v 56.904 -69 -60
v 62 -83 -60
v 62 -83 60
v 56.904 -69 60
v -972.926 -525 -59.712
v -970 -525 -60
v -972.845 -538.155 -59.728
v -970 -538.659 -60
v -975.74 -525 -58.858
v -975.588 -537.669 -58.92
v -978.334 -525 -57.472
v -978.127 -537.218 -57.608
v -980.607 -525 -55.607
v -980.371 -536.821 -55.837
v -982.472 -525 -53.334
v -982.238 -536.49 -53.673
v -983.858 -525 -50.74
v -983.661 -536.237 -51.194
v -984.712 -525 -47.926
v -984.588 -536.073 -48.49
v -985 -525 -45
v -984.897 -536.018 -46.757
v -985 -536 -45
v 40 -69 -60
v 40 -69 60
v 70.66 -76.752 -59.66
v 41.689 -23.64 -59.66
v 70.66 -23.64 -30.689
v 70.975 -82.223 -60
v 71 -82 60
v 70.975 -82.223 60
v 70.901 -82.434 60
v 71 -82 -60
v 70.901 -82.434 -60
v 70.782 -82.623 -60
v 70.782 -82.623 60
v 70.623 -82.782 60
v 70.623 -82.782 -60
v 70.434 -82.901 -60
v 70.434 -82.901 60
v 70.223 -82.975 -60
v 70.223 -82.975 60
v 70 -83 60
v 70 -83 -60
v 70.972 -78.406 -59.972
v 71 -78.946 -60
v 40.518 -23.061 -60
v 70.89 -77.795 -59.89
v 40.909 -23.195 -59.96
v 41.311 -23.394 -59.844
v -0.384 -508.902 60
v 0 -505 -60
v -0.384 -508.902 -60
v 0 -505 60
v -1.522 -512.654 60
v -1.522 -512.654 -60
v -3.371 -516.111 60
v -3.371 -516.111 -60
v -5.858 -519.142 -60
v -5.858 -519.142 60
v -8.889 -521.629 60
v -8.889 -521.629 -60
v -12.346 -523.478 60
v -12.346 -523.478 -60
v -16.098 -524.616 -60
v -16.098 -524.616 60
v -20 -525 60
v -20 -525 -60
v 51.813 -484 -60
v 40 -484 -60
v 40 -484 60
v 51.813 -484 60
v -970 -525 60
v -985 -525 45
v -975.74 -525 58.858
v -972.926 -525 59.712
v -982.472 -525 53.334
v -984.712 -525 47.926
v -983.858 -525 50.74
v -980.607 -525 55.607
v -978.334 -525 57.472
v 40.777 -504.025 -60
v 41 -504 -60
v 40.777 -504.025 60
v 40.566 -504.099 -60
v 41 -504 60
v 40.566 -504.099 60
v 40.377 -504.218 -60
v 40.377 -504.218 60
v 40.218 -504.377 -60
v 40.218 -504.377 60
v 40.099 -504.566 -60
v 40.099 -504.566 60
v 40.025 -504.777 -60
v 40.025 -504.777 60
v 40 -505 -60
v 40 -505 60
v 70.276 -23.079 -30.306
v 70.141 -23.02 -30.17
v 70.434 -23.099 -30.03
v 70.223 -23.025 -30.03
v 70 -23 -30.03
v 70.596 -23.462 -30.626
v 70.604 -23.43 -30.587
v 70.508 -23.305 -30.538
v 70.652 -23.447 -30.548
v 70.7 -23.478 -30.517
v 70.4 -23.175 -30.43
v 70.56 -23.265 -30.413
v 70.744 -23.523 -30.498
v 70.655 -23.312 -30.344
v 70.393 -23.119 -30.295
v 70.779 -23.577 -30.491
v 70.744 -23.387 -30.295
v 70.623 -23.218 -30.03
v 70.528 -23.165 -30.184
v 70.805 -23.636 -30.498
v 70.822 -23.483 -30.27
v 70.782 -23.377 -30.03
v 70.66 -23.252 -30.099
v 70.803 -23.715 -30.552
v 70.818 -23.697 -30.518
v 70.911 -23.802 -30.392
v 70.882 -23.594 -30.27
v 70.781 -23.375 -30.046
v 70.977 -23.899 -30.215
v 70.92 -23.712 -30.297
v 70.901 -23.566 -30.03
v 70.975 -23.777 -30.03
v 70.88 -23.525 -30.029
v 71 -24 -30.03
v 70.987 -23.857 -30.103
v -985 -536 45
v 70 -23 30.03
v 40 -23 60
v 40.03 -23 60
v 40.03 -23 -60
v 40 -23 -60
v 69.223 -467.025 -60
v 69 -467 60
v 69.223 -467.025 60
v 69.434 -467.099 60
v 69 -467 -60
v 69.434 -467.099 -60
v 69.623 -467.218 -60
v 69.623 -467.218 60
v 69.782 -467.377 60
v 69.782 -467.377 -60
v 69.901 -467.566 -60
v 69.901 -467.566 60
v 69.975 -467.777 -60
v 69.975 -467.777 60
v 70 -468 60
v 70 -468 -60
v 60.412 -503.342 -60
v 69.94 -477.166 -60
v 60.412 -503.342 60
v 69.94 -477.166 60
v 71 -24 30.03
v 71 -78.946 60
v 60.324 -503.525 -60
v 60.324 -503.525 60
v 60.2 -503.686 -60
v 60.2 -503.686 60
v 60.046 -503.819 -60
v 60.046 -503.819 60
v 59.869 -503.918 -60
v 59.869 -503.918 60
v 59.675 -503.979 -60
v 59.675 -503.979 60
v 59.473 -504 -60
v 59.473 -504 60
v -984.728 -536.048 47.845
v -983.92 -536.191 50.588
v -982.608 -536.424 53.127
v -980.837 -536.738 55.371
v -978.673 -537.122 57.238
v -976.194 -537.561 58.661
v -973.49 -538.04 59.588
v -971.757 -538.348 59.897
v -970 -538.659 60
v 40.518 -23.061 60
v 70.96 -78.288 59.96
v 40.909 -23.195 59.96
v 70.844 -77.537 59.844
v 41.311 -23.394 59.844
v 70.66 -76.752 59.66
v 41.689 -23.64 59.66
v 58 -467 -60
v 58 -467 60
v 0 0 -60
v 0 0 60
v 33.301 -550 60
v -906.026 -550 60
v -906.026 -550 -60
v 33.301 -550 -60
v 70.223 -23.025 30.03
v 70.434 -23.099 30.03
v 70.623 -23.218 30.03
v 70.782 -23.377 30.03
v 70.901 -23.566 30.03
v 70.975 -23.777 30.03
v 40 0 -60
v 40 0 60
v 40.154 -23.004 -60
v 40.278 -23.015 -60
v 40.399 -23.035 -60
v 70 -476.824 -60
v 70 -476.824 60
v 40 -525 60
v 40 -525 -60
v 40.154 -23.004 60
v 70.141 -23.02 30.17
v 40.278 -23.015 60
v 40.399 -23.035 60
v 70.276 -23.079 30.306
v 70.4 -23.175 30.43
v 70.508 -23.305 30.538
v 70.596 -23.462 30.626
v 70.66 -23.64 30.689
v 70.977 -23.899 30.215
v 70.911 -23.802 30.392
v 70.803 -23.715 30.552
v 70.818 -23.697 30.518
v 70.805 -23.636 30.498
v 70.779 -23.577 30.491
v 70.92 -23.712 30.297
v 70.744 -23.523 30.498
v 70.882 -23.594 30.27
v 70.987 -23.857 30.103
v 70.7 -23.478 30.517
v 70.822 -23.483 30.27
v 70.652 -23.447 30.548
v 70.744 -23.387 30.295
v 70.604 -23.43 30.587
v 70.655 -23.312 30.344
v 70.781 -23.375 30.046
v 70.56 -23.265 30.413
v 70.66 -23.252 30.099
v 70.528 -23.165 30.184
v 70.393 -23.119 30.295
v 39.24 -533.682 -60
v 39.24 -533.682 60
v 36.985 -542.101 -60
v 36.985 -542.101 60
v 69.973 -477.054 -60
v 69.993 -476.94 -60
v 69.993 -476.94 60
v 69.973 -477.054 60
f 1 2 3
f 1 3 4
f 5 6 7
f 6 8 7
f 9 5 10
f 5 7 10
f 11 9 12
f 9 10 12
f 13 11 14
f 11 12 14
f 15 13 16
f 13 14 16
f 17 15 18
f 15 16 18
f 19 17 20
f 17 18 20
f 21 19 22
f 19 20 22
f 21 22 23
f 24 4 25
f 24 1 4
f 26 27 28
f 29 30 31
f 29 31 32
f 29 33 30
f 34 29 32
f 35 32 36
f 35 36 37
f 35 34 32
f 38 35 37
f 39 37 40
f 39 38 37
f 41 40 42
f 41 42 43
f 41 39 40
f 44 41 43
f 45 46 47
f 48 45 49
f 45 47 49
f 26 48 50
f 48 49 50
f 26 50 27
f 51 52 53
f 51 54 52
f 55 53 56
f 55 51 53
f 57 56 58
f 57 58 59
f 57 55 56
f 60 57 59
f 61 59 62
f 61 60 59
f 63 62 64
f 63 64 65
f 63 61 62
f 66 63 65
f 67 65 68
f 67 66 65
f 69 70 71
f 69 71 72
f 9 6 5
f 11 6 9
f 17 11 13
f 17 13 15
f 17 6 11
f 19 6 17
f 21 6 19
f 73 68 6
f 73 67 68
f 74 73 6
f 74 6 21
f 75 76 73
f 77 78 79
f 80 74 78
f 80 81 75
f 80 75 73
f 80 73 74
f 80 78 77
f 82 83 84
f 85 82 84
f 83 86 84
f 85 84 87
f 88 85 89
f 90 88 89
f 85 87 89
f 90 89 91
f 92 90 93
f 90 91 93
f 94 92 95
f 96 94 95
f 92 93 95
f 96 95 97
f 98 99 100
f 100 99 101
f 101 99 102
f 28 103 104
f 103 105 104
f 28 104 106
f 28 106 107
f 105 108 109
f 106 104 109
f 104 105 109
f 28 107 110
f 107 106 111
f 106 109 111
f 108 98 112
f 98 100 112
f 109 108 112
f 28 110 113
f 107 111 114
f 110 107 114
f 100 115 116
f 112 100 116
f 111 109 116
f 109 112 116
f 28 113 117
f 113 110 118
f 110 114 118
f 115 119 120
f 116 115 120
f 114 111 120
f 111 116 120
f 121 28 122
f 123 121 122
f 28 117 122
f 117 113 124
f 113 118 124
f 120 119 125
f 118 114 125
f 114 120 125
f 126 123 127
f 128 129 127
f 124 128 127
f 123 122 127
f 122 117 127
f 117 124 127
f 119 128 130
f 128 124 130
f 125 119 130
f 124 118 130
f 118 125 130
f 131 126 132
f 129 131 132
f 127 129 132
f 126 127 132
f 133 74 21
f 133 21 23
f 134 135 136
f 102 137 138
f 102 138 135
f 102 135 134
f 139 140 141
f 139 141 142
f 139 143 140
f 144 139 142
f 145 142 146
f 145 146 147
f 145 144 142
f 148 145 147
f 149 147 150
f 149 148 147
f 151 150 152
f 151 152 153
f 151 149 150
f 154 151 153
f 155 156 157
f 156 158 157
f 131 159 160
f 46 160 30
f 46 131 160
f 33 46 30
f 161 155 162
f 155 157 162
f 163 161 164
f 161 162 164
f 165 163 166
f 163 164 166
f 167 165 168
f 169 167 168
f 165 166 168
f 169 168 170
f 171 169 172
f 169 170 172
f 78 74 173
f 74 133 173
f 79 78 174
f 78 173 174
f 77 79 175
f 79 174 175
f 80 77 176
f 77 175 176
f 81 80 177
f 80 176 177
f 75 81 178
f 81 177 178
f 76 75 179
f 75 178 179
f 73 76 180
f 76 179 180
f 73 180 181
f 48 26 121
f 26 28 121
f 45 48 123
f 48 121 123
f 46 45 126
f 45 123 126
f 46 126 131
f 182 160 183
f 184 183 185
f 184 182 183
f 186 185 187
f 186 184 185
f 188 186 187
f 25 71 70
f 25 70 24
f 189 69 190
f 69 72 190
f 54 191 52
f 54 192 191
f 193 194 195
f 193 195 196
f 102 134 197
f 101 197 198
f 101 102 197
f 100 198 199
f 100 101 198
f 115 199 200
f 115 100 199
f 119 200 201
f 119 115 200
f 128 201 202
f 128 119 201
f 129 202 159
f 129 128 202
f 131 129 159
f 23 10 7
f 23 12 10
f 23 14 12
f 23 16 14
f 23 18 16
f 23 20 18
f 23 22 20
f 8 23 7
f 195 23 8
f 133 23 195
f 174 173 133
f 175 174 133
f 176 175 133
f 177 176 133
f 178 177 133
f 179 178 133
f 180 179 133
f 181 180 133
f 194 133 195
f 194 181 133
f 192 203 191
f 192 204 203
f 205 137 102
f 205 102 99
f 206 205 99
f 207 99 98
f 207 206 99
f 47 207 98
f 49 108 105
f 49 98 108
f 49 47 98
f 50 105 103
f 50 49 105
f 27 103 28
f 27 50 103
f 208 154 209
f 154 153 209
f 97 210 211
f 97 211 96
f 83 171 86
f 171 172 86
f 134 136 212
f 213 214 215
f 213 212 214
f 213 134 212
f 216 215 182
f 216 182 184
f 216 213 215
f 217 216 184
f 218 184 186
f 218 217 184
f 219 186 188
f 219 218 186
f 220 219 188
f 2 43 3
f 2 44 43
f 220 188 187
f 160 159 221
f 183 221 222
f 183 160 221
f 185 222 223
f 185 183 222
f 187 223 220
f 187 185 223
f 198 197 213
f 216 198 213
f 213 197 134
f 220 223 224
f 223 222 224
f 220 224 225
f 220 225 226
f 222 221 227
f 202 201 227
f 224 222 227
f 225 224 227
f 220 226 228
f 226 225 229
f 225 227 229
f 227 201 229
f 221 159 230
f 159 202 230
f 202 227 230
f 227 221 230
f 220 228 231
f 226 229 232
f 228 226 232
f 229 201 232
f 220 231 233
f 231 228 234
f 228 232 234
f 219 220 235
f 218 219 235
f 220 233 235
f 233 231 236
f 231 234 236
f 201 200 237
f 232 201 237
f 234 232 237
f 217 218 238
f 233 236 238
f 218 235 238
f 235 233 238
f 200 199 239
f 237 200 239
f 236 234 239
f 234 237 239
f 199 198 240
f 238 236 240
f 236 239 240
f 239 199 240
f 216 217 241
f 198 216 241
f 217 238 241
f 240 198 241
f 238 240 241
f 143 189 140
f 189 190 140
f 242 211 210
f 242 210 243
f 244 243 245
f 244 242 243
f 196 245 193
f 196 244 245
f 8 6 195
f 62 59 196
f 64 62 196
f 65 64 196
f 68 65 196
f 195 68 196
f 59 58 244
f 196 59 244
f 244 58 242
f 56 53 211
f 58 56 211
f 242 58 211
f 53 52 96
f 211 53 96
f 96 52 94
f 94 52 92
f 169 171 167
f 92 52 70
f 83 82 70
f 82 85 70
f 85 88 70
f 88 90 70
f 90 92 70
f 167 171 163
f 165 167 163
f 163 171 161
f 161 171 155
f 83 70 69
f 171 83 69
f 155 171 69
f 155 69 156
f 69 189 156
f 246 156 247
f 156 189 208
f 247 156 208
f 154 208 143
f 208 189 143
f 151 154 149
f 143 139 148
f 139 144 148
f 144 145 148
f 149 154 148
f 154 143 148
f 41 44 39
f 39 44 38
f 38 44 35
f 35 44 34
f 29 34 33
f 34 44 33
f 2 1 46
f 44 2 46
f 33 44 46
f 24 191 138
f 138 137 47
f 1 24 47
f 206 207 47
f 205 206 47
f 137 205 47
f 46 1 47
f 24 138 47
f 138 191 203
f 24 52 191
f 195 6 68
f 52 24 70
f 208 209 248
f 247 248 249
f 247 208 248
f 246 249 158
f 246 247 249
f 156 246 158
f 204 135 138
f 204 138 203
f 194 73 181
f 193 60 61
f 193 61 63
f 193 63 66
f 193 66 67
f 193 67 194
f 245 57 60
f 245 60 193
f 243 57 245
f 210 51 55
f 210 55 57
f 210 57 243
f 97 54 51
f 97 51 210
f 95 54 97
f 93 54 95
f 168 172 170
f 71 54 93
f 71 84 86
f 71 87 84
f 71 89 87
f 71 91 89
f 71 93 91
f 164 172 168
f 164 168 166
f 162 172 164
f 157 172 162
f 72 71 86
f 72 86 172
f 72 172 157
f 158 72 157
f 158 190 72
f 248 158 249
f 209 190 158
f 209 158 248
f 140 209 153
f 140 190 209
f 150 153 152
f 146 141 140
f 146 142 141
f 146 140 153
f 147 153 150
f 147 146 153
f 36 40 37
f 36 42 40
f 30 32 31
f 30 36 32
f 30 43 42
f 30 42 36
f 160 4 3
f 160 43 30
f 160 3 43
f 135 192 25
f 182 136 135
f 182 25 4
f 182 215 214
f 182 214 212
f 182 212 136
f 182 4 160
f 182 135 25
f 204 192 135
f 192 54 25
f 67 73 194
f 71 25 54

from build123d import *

# Parameters (mm, degrees)
BOSS_EXTRUDE1_DEPTH = 60
FILLET1_R           = 20
FILLET2_R           = 50
SKETCH2_W           = 946.025641026
SKETCH2_H           = 25
CUT_EXTRUDE1_DEPTH  = 1147.843494118
FILLET3_R           = 15
BOSS_EXTRUDE2_DEPTH = 60
CHAMFER1_START      = 58.356662002
CHAMFER1_OUTLINE_W  = 43
CHAMFER1_OUTLINE_H  = 66
CHAMFER1_DEPTH      = 20.643337998
CHAMFER2_START      = 58.356662002
CHAMFER2_OUTLINE_W  = 43
CHAMFER2_OUTLINE_H  = 66
CHAMFER2_DEPTH      = 20.643337998
FILLET4_R           = 1


with BuildPart() as part:
    # Sketch1 → Boss-Extrude1 (new, symmetric)
    with BuildSketch(Plane.XY):
        Polygon((0, 0), (0, -525), (-985, -525), (-985, -536), (-765, -575), (40, -575), (40, 0), align=None)
    extrude(amount=BOSS_EXTRUDE1_DEPTH, both=True)

    # Fillet1
    fillet1_edges = [part.edges().sort_by_distance(p)[0] for p in [
        (0, -525, 0),
    ]]
    fillet(fillet1_edges, radius=FILLET1_R)

    # Fillet2
    fillet2_edges = [part.edges().sort_by_distance(p)[0] for p in [
        (40, -575, 0),
    ]]
    fillet(fillet2_edges, radius=FILLET2_R)

    # Sketch2 → Cut-Extrude1 (cut, through all)
    with BuildSketch(Plane.XY.offset(60)):
        with Locations((-433.012820513, -562.5)):
            Rectangle(SKETCH2_W, SKETCH2_H)
    extrude(amount=-CUT_EXTRUDE1_DEPTH, mode=Mode.SUBTRACT)

    # Fillet3
    fillet3_edges = [part.edges().sort_by_distance(p)[0] for p in [
        (-985, -530.5, 60),
        (-985, -530.5, -60),
    ]]
    fillet(fillet3_edges, radius=FILLET3_R)

    # Sketch4 → Boss-Extrude2 (add, symmetric)
    with BuildSketch(Plane.XY):
        Polygon((40, -23), (71, -23), (71, -83), (62, -83), (56.90441672, -69), (40, -69), align=None)
        Polygon((40, -484), (51.812506017, -484), (58, -467), (70, -467), (70, -477), (60.172803675, -504), (40, -504), align=None)
    extrude(amount=BOSS_EXTRUDE2_DEPTH, both=True)

    # Chamfer1: read off the stored shape, not the designer's step
    # Chamfer1 outline → Chamfer1 (cut)
    with BuildSketch(Plane(origin=(0, 0, 0), x_dir=(0.7514973063417119, -0.31591606508632464, -0.5791794526582624), z_dir=(0.659736158294474, 0.35985608634244, 0.659736158294474)).offset(CHAMFER1_START)):
        with Locations((23.5, -66)):
            Rectangle(CHAMFER1_OUTLINE_W, CHAMFER1_OUTLINE_H)
    extrude(amount=CHAMFER1_DEPTH, mode=Mode.SUBTRACT)

    # Chamfer2: read off the stored shape, not the designer's step
    # Chamfer2 outline → Chamfer2 (cut)
    with BuildSketch(Plane(origin=(0, 0, 0), x_dir=(0.7514973063417119, -0.31591606508632464, 0.5791794526582624), z_dir=(0.659736158294474, 0.35985608634244, -0.659736158294474)).offset(CHAMFER2_START)):
        with Locations((23.5, 66)):
            Rectangle(CHAMFER2_OUTLINE_W, CHAMFER2_OUTLINE_H)
    extrude(amount=CHAMFER2_DEPTH, mode=Mode.SUBTRACT)

    # Fillet4
    fillet4_edges = [part.edges().sort_by_distance(p)[0] for p in [
        (56, -50.5, 60),
        (71, -23, 0),
        (71, -50.5, 45),
        (56, -23, 45),
        (56, -23, -45),
        (71, -50.5, -45),
        (56, -50.5, -60),
        (71, -83, 0),
        (40, -504, 0),
        (60.172803675, -504, 0),
        (70, -477, 0),
        (70, -467, 0),
    ]]
    fillet(fillet4_edges, radius=FILLET4_R)


solid = part.part
